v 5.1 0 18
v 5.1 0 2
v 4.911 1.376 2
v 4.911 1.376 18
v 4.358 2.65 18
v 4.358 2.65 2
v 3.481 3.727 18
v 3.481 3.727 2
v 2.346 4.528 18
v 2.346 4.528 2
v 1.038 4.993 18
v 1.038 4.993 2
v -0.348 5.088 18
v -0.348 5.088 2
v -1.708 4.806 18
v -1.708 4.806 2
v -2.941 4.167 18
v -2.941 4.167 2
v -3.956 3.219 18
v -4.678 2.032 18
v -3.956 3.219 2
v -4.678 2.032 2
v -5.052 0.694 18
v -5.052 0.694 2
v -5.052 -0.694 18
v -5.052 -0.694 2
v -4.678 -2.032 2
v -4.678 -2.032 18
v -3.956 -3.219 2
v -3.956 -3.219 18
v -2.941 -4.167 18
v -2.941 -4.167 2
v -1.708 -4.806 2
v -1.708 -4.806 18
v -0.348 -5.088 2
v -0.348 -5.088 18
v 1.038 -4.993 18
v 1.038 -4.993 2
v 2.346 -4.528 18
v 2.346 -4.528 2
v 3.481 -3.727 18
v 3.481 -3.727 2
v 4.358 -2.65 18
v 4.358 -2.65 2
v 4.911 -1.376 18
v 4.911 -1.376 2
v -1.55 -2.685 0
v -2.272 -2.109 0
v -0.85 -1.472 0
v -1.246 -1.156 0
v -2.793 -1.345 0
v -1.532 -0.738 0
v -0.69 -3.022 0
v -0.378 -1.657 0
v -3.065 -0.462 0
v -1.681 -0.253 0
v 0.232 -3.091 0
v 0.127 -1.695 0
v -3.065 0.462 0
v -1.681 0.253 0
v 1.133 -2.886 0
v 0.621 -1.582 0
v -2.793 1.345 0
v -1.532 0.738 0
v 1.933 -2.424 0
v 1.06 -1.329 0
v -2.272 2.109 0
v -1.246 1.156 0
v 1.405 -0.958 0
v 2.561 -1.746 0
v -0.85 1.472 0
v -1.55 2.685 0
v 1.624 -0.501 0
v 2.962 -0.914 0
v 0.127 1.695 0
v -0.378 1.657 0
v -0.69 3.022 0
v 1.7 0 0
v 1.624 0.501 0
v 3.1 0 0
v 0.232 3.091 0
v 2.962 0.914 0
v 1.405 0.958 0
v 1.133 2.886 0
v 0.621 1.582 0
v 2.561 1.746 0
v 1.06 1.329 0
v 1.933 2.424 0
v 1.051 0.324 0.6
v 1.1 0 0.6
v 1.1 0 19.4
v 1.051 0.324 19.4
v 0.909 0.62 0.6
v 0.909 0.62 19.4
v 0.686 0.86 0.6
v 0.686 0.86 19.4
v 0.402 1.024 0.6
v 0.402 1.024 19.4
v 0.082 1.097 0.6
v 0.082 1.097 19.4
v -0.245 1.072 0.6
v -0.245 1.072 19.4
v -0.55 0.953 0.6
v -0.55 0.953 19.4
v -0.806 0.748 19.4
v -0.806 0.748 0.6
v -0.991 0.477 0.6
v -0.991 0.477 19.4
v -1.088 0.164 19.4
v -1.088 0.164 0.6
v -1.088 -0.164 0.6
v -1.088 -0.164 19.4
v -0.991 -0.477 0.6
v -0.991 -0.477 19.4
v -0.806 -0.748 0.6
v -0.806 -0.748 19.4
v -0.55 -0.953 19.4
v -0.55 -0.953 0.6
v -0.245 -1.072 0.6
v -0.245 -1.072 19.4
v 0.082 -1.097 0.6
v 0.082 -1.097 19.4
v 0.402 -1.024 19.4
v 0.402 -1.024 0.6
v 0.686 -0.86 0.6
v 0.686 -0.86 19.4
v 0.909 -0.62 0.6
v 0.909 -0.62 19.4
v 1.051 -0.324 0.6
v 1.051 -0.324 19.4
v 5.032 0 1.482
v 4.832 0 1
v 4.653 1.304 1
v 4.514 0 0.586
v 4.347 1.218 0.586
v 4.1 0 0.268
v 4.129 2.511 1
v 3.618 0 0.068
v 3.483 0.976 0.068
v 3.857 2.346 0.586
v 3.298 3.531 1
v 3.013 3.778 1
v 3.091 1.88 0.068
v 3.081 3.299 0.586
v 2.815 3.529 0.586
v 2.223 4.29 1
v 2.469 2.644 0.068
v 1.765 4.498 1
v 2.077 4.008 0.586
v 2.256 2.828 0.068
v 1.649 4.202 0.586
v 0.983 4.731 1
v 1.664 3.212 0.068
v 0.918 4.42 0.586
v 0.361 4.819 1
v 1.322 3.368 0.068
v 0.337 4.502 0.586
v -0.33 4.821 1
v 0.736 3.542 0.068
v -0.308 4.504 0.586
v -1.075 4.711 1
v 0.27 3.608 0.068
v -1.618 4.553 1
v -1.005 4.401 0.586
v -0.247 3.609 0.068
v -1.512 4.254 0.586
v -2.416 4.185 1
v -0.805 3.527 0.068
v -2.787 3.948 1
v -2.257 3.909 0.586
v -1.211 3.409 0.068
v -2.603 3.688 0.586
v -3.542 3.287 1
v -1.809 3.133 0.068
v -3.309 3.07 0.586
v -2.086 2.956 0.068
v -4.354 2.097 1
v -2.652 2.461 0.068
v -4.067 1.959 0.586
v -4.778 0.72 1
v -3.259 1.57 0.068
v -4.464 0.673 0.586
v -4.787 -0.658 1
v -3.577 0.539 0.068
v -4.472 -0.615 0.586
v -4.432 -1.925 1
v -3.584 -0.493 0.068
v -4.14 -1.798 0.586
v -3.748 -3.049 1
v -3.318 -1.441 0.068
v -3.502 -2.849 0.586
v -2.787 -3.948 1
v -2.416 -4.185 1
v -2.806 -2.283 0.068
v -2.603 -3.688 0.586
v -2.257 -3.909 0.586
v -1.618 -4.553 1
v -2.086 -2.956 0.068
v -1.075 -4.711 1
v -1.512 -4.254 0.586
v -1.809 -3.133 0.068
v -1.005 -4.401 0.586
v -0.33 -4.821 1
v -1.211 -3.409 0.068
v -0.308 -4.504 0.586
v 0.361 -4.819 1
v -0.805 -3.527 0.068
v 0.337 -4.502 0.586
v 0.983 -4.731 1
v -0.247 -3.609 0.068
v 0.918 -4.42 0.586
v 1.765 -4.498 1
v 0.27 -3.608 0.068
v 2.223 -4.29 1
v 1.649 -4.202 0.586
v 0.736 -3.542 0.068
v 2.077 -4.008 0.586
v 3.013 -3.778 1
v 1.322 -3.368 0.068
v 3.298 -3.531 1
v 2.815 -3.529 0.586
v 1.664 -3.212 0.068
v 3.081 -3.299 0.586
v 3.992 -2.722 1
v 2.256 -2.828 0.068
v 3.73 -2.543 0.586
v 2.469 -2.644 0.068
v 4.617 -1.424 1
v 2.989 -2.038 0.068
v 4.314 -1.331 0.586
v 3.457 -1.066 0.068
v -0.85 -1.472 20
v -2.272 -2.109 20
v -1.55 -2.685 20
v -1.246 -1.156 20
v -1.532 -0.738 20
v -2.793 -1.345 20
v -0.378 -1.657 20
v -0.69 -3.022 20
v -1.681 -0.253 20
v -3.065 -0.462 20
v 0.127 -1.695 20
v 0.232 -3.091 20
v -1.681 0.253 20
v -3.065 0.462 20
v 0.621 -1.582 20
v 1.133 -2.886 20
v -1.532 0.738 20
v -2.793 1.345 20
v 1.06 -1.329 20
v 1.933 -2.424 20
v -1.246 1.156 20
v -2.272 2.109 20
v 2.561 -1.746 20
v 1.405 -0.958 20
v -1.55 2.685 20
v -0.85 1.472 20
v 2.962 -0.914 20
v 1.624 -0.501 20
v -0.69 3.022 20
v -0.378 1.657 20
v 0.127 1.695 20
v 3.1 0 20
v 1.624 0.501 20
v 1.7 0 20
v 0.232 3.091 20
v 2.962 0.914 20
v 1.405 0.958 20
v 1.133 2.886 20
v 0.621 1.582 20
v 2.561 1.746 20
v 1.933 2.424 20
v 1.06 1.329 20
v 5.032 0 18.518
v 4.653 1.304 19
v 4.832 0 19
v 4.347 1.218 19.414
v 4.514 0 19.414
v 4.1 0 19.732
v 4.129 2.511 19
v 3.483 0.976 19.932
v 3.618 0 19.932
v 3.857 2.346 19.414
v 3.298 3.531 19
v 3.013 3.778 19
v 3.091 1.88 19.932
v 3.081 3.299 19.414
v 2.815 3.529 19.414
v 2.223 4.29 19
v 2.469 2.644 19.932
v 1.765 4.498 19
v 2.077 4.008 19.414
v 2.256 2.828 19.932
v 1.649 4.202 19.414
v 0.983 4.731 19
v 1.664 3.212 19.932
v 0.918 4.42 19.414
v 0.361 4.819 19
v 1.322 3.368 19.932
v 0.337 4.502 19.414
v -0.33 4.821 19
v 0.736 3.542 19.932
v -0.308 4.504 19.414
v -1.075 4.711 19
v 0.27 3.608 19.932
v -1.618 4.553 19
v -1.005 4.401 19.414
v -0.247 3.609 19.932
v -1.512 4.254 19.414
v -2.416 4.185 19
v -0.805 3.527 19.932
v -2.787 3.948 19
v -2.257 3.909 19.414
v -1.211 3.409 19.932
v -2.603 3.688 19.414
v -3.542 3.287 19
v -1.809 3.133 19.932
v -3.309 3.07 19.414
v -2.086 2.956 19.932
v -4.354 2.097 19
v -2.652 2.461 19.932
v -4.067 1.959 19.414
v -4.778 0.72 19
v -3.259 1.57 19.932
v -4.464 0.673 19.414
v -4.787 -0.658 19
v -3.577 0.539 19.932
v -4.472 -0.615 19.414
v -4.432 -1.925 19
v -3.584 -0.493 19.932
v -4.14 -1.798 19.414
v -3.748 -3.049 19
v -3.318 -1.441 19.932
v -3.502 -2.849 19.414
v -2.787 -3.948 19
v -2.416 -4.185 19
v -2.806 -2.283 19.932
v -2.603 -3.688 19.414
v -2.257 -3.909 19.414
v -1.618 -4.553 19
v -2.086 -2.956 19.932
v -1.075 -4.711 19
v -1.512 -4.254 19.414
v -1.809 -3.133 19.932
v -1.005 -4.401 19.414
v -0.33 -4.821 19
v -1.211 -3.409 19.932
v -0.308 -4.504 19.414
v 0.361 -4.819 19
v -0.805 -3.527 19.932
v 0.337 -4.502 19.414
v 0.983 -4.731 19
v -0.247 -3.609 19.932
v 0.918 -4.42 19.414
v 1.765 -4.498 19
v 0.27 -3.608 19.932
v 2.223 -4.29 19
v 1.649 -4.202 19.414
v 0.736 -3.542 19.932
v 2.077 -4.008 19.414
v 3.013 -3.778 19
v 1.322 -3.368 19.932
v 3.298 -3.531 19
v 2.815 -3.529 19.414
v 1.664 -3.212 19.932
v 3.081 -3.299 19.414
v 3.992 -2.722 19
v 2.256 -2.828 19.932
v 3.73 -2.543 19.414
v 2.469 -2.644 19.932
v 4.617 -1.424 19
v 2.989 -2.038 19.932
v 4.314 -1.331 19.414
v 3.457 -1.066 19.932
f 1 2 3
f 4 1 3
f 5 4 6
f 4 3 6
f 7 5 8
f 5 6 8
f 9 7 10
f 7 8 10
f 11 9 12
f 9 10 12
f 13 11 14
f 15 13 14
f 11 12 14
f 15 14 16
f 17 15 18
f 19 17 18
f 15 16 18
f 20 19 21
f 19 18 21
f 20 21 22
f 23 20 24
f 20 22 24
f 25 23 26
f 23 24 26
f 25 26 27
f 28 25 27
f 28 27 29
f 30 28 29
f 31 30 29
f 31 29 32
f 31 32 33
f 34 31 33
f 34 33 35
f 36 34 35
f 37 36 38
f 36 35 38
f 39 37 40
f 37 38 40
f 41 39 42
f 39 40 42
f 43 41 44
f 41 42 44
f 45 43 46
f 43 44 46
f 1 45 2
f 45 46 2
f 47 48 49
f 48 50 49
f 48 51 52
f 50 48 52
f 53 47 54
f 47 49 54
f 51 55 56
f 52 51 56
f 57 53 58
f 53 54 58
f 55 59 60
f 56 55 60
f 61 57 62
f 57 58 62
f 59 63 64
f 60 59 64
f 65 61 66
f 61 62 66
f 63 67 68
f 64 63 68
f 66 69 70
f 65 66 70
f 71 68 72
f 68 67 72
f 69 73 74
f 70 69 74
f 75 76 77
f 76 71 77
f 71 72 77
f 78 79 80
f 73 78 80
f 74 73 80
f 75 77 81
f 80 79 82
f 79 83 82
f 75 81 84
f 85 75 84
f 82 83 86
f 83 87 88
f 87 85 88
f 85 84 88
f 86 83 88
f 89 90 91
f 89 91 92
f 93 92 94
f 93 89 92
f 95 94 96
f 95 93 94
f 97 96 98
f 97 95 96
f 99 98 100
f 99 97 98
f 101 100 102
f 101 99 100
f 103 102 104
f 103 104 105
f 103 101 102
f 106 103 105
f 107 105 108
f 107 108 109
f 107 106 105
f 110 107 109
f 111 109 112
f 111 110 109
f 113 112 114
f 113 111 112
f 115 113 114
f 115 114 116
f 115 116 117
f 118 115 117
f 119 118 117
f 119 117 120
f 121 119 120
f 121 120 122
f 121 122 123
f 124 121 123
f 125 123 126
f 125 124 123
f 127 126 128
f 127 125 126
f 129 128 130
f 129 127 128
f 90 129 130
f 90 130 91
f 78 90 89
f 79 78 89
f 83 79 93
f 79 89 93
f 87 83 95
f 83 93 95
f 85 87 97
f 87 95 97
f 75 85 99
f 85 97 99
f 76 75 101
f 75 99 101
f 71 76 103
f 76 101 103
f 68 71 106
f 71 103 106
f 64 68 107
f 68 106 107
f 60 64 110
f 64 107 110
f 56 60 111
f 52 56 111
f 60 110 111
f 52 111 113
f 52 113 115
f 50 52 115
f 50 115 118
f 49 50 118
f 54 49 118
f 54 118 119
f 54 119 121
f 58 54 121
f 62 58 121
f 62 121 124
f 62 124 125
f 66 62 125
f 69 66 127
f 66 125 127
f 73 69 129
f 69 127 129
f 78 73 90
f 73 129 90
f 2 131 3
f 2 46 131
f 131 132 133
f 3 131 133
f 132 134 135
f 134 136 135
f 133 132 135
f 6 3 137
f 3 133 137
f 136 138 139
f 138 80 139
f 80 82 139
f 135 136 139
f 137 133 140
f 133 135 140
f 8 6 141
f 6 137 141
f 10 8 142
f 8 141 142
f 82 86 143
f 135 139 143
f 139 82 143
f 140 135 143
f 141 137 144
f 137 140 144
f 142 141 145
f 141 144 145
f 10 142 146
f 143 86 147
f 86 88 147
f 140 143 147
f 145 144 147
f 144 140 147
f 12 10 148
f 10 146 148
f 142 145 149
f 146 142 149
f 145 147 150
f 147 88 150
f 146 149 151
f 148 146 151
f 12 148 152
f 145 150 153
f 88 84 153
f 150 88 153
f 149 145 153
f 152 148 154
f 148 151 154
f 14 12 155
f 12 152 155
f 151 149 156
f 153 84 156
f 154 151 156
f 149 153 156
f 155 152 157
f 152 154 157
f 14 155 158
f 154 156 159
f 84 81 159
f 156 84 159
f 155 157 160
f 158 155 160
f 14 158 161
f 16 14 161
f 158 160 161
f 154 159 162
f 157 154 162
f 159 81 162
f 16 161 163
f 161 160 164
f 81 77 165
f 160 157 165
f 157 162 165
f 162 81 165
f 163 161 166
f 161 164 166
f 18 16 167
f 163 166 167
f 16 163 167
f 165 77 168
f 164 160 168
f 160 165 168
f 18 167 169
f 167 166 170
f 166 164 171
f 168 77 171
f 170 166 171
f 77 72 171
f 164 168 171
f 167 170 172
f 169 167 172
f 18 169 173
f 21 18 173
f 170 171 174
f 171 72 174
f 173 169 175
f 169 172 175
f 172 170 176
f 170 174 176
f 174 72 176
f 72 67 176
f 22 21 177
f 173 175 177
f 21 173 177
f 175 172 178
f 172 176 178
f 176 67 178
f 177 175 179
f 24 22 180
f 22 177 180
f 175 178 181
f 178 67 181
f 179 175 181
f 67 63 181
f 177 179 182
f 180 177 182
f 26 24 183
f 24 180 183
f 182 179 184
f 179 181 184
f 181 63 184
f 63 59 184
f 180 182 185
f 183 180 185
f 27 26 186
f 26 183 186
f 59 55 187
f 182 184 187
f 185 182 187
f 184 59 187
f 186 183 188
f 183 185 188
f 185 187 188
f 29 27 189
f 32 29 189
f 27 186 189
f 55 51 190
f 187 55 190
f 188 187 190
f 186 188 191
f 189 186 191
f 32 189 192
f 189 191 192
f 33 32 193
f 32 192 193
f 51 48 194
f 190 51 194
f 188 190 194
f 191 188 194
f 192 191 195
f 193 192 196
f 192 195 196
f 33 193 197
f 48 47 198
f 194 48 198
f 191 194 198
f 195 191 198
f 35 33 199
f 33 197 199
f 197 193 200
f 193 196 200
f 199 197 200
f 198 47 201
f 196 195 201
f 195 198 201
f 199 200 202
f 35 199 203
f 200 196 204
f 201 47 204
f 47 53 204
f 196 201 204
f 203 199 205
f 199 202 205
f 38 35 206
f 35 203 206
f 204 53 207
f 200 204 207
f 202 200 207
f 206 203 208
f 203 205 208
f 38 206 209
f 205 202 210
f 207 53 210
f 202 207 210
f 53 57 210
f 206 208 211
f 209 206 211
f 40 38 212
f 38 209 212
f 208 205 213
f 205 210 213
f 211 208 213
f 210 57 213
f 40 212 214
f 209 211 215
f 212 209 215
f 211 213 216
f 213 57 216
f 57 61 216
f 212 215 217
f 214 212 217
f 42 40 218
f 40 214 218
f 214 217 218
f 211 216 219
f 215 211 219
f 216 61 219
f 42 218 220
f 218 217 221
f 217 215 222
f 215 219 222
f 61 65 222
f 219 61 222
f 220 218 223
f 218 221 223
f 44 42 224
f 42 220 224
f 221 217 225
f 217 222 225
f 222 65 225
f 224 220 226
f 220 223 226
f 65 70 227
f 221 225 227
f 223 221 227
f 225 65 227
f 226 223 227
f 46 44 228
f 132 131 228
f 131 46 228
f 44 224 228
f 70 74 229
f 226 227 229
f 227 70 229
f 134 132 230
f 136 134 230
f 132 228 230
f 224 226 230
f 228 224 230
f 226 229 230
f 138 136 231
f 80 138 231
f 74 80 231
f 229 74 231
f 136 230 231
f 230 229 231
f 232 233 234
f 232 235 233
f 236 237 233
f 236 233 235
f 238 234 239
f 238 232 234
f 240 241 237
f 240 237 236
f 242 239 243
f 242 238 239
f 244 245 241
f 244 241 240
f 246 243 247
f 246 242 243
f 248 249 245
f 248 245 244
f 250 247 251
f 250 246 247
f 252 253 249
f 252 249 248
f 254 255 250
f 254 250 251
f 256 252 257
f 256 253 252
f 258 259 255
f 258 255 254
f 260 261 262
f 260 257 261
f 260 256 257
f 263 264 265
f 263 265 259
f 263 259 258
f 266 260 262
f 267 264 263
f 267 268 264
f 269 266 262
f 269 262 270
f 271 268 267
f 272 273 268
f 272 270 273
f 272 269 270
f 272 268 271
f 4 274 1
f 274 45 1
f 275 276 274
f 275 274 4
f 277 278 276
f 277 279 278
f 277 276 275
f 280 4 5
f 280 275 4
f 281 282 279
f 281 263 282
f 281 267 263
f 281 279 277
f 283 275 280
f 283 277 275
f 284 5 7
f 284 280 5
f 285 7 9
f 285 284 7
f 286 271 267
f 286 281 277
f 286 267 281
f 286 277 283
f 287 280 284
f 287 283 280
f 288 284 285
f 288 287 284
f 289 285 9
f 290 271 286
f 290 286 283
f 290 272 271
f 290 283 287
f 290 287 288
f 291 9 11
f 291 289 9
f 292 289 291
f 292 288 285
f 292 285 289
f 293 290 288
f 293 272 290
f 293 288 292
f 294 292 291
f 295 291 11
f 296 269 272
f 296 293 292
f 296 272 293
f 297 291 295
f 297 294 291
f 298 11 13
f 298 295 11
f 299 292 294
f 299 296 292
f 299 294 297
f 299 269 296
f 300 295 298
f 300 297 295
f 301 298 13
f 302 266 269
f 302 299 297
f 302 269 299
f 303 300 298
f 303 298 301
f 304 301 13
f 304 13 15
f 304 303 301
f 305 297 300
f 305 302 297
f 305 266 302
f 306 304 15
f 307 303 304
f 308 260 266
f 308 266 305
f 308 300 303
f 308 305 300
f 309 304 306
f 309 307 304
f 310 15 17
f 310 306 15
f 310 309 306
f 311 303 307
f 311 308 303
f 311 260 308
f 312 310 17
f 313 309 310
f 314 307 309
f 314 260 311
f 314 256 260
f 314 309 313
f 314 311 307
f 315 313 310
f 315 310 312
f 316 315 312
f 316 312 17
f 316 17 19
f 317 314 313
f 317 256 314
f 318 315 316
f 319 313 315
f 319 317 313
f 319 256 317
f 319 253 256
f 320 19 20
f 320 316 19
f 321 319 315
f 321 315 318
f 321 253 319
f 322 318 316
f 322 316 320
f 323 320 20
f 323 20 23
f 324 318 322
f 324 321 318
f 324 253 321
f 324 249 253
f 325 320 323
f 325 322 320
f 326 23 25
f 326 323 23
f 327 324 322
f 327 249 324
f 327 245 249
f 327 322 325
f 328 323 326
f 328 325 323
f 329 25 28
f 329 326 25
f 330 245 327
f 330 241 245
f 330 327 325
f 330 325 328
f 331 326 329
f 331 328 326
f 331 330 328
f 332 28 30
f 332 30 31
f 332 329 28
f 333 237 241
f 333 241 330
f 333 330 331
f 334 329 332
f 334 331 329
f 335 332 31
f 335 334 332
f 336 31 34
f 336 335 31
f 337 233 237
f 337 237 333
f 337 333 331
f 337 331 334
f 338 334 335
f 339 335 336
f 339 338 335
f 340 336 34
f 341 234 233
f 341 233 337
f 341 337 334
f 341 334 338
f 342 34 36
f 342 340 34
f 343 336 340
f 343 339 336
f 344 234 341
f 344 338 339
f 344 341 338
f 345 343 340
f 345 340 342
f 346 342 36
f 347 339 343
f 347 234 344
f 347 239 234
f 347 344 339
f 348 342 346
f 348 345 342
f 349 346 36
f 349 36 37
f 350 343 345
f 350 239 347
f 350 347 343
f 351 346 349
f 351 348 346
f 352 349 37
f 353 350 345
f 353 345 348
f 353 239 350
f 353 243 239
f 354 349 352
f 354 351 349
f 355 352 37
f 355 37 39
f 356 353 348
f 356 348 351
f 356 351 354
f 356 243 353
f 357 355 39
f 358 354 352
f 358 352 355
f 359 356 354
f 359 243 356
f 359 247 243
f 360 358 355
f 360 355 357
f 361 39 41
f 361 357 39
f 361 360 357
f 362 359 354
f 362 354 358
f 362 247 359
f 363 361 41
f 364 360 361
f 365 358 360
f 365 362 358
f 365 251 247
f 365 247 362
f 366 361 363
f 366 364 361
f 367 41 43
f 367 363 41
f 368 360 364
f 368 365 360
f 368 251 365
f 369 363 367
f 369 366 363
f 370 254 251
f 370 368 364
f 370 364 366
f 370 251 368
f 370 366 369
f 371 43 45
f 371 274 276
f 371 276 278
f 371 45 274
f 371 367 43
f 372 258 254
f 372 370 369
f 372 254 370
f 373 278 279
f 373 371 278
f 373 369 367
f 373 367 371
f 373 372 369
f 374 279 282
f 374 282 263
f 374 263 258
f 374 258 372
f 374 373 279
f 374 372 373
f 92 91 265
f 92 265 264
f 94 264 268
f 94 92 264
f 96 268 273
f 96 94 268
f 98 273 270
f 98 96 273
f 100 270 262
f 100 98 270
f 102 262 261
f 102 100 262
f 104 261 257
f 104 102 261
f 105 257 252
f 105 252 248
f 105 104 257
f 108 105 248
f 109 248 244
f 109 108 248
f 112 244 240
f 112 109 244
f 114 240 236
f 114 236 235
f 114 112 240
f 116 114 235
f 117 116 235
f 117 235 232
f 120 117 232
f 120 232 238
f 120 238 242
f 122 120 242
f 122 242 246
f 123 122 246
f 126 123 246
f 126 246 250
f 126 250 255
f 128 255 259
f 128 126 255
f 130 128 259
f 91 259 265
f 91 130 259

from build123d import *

# Parameters (mm, degrees)
F0_R     = 5.1
F0_R_2   = 1.1
F1_DEPTH = 20
F2_R     = 2
F3_SIZE  = 0.6


with BuildPart() as f1:
    # F0 (on Top) → F1 (new body)
    with BuildSketch(Plane.XY):
        Circle(F0_R)
        Circle(F0_R_2, mode=Mode.SUBTRACT)
    extrude(amount=F1_DEPTH)

    # F2
    f2_edges = [f1.edges().sort_by_distance(p)[0] for p in [
        (-5.1, 0, 20),
        (-5.1, 0, 0),
    ]]
    fillet(f2_edges, radius=F2_R)

    # F3
    f3_edges = [f1.edges().sort_by_distance(p)[0] for p in [
        (-1.1, 0, 20),
        (-1.1, 0, 0),
    ]]
    chamfer(f3_edges, length=F3_SIZE)


solid = f1.part
